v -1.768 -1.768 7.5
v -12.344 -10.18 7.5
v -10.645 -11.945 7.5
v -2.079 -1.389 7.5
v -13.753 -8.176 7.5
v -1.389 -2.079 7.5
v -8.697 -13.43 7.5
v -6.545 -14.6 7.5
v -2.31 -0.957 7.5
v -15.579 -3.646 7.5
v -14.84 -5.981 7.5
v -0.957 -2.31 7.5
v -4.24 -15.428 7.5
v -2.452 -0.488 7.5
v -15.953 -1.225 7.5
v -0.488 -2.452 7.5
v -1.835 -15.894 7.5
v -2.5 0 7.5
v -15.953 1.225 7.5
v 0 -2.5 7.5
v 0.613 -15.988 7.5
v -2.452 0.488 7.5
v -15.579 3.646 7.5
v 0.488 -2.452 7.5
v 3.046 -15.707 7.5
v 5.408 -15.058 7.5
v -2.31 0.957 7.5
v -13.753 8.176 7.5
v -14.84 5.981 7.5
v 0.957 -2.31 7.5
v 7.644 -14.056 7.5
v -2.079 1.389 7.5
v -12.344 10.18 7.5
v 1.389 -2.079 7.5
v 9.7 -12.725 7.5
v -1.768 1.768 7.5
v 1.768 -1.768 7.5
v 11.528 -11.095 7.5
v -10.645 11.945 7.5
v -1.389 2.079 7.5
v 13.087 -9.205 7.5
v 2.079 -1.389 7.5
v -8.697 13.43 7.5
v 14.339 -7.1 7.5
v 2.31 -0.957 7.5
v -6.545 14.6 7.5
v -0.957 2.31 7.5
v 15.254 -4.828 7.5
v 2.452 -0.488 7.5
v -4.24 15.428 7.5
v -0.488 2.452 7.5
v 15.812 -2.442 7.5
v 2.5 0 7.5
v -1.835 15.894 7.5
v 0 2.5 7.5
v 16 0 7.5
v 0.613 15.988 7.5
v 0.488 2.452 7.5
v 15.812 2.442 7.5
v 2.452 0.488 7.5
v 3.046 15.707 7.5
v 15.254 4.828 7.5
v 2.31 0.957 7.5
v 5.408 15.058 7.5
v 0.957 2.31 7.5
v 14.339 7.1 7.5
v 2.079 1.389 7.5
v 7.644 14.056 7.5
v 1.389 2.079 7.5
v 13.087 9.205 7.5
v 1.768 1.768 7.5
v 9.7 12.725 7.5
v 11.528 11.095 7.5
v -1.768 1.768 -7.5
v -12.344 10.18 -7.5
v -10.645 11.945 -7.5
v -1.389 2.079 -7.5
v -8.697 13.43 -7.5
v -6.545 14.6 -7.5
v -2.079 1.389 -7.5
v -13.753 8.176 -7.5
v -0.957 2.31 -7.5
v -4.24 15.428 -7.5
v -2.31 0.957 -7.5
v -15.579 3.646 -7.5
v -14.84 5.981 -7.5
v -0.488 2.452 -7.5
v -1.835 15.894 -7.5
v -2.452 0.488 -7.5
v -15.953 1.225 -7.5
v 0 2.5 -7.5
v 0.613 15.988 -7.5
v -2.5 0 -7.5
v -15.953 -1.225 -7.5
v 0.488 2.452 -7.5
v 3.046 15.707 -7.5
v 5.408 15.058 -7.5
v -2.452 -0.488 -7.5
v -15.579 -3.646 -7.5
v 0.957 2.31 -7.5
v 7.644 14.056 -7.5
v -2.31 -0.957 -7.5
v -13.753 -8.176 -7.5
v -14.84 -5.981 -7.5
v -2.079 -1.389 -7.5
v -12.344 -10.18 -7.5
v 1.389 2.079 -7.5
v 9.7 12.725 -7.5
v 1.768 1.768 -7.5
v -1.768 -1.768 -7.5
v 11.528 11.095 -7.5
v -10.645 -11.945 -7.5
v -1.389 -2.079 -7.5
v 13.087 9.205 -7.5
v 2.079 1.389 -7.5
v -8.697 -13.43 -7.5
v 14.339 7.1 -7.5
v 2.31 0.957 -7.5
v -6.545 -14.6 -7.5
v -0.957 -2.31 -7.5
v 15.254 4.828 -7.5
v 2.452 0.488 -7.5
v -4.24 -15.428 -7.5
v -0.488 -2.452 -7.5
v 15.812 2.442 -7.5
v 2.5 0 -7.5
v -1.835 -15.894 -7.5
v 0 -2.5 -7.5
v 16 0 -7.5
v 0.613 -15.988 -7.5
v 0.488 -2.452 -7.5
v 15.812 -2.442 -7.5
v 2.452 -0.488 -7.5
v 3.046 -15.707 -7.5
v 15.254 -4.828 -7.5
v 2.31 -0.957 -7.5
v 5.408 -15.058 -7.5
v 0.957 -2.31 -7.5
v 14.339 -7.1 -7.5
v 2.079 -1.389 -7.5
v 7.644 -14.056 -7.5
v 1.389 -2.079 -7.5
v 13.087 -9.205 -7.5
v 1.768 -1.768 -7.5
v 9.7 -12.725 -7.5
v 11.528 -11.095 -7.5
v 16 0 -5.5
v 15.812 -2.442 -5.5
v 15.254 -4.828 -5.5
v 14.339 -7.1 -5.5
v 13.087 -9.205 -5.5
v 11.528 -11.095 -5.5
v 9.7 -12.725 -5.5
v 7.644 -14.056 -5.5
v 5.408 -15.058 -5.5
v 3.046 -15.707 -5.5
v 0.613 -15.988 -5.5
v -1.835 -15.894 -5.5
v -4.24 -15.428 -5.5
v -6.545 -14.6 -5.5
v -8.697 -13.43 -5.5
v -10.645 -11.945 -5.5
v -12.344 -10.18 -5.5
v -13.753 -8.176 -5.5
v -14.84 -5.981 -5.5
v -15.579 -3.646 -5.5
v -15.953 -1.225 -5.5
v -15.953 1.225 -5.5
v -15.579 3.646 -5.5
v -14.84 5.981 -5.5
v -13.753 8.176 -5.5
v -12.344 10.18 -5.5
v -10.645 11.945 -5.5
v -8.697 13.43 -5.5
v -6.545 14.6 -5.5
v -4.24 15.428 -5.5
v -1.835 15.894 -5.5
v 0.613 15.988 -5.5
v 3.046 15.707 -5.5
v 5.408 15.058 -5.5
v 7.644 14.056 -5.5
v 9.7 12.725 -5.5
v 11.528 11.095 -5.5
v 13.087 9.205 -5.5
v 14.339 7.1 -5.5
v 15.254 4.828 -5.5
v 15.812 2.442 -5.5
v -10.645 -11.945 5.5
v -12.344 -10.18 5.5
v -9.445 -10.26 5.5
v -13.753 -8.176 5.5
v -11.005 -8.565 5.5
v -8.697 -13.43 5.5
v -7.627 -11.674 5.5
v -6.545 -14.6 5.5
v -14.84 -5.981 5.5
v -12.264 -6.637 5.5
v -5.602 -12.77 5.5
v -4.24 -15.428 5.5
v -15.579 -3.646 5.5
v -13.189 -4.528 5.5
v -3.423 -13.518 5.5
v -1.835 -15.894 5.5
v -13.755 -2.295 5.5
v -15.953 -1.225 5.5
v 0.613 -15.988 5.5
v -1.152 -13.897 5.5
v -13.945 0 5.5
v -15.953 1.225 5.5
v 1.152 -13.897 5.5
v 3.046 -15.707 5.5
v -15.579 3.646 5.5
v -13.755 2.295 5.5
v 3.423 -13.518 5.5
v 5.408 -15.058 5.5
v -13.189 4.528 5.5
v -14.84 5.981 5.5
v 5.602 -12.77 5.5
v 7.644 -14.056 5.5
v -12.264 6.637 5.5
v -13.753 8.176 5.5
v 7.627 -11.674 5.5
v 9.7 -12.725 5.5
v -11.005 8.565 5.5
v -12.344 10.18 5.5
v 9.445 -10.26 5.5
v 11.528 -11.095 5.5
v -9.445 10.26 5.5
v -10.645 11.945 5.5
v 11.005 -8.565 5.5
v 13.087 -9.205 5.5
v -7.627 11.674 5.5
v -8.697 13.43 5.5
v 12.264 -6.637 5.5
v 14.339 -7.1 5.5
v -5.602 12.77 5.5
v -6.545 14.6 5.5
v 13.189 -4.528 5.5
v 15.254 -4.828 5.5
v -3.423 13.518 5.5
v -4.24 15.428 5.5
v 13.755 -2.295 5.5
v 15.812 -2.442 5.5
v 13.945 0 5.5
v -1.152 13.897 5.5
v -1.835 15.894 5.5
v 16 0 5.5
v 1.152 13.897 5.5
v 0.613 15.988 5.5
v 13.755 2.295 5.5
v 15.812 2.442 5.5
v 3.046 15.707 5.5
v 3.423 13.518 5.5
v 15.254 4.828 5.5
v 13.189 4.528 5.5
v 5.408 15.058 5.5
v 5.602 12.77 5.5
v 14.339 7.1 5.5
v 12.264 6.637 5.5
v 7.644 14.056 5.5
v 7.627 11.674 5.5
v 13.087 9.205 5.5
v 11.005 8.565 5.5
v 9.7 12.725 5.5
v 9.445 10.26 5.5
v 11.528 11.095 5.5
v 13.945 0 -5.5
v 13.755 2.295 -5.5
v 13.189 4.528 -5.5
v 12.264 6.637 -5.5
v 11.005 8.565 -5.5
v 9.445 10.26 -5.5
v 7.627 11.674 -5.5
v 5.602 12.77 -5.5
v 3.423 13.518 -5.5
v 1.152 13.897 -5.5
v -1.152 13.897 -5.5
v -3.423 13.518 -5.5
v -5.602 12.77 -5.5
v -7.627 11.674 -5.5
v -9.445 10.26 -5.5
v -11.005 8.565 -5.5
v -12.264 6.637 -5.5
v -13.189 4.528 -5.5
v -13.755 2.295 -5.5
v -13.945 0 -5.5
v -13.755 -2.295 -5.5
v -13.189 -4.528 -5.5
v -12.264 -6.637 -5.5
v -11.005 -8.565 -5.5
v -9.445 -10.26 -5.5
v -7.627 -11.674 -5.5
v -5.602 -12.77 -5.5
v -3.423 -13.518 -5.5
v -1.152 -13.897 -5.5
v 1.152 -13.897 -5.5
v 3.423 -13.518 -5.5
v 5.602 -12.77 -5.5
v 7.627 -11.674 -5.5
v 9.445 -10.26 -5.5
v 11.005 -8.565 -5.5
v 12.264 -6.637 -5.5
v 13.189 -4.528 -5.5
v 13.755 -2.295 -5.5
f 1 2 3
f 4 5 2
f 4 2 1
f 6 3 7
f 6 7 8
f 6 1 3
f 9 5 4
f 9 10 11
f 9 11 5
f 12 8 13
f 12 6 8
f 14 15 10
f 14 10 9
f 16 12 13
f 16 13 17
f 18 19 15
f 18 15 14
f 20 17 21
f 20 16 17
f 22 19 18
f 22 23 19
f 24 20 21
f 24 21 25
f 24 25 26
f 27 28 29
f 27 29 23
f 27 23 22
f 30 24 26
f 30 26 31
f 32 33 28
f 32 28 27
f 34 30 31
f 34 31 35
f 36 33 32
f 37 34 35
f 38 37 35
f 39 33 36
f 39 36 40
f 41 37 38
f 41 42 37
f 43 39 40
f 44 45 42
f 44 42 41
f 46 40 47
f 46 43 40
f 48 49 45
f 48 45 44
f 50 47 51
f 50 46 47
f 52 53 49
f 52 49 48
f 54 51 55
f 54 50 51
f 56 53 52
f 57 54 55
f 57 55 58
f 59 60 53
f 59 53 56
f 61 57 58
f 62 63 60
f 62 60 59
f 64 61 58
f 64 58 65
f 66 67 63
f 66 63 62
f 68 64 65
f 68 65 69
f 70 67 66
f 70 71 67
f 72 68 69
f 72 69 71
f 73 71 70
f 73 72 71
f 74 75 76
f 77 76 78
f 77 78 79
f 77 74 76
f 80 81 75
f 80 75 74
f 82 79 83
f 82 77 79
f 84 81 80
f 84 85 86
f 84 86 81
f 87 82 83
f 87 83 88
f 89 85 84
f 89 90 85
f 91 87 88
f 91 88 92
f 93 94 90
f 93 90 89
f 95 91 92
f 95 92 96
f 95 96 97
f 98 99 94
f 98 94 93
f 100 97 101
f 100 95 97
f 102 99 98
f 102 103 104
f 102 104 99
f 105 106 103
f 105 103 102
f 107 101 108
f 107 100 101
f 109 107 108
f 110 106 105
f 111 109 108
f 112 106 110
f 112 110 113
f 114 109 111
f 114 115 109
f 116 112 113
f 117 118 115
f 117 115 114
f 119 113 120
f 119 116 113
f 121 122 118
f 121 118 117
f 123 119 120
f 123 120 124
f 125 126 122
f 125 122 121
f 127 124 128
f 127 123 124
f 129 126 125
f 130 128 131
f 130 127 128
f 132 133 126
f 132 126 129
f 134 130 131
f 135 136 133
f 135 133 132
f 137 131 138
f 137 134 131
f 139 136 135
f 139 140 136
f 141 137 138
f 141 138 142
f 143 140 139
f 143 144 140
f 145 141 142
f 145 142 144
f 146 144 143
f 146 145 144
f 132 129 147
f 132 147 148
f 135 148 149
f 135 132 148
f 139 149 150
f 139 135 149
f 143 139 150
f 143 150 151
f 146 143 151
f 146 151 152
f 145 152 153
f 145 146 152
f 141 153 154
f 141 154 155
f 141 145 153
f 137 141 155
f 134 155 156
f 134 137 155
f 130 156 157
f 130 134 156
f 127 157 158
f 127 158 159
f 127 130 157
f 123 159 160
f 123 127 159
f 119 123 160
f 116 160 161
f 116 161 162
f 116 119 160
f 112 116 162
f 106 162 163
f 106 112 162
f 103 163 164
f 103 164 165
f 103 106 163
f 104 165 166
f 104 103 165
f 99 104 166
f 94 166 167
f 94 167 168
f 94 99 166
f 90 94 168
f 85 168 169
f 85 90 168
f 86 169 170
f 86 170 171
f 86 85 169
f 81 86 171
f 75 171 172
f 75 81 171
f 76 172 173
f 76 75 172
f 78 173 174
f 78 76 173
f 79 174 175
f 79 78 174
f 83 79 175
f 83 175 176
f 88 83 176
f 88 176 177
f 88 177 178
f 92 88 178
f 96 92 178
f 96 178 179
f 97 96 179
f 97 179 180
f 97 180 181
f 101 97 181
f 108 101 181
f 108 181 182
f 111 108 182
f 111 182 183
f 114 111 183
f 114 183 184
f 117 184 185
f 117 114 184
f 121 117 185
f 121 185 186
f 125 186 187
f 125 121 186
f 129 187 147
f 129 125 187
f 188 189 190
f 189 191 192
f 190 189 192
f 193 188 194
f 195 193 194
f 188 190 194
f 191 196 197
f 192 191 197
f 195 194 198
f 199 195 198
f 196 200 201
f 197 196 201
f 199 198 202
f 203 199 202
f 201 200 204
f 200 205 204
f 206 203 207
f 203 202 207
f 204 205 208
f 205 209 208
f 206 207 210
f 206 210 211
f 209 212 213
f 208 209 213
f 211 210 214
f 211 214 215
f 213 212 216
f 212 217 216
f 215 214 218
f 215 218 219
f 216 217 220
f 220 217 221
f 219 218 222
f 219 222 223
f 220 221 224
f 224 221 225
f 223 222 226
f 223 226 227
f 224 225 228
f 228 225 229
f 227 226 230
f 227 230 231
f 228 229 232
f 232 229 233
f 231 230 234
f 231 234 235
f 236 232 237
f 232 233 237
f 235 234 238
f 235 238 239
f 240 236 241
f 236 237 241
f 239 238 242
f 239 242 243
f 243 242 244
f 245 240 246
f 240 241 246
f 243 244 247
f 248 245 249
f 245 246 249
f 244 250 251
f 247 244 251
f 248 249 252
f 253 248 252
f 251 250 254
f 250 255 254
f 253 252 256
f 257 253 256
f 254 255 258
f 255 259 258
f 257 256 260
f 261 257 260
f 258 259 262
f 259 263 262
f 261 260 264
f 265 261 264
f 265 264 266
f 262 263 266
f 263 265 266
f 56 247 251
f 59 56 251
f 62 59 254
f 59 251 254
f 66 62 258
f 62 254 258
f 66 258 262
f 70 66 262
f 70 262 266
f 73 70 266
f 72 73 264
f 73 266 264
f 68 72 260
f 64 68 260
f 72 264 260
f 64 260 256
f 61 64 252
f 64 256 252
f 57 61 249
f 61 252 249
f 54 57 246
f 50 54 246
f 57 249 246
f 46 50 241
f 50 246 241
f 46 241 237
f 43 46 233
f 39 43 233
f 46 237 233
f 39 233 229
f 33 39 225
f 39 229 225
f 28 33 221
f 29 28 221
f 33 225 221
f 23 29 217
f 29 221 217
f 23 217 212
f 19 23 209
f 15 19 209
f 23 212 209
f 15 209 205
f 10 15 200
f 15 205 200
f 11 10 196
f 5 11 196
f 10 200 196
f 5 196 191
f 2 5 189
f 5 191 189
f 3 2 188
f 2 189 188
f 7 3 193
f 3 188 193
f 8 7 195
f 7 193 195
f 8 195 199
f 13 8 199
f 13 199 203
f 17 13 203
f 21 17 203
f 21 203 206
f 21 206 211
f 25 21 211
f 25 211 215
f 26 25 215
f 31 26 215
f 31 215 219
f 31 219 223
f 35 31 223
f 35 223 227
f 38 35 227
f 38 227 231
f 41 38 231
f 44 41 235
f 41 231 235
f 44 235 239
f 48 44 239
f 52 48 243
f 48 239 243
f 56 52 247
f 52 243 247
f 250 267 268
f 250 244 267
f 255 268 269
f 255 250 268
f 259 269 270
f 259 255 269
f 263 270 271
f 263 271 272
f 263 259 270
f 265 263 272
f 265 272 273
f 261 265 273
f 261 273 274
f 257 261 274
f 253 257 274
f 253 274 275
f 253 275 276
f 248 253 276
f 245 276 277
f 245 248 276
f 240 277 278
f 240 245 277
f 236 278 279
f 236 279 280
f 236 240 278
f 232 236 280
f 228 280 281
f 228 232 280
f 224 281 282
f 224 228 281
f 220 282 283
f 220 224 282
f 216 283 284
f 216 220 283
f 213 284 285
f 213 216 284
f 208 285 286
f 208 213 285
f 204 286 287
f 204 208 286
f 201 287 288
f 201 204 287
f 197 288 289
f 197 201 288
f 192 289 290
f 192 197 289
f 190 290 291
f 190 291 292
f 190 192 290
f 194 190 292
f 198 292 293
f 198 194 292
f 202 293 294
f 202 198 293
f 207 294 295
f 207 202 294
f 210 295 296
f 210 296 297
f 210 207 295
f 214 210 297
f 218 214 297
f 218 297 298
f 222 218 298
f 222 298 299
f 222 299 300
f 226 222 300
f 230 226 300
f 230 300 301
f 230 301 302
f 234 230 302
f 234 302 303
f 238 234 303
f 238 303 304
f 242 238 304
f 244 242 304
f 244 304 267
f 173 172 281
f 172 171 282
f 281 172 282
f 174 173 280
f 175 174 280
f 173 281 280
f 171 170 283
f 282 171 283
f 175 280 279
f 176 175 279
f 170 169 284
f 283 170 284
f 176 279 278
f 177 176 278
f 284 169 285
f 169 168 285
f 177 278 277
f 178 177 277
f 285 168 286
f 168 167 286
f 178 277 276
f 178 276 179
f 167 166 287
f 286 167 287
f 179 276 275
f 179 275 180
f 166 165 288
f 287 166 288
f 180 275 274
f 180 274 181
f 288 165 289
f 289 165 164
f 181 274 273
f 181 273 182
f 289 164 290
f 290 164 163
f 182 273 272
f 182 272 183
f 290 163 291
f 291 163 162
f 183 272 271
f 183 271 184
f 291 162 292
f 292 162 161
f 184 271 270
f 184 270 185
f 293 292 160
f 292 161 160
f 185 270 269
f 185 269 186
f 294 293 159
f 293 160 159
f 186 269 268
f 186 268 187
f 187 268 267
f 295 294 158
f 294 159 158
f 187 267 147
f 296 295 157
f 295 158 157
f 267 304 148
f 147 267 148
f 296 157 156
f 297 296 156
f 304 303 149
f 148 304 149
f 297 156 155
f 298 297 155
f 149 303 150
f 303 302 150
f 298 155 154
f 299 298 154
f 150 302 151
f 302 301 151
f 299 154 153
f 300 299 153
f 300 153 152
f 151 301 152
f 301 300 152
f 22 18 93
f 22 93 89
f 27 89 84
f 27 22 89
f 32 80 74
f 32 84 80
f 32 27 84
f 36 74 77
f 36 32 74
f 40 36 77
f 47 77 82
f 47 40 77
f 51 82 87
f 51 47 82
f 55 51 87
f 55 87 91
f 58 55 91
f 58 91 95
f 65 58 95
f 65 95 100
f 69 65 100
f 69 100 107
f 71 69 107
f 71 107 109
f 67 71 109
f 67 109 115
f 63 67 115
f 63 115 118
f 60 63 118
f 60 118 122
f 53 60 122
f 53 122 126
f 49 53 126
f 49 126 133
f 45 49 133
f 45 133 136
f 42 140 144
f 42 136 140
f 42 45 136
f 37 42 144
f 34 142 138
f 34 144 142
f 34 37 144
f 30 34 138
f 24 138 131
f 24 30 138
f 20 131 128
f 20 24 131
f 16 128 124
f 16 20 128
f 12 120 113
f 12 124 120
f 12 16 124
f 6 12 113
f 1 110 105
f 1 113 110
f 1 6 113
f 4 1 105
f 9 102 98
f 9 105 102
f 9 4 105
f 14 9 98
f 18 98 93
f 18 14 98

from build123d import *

# Parameters (mm, degrees)
SKETCH_1_R               = 13.945
EXTRUDE_1_DEPTH          = 5.5
SKETCH_2_R               = 16
EXTRUDE_2_DEPTH          = 2
EXTRUDE_START            = 2
SKETCH_3_R               = 16
EXTRUDE_3_DEPTH          = 2
CUT_EXTRUDE_1_DEPTH      = 28.147743921
CUT_EXTRUDE_1_DEPTH_BACK = 28.147743921
SKETCH_4_R               = 2.5


with BuildPart() as part:
    # 草图1 → 凸台-拉伸1 (new, symmetric)
    with BuildSketch(Plane.XY):
        Circle(SKETCH_1_R)
    extrude(amount=EXTRUDE_1_DEPTH, both=True)

    # 草图2 → 凸台-拉伸2 (add)
    with BuildSketch(Plane.XY.offset(5.5)):
        Circle(SKETCH_2_R)
    extrude(amount=EXTRUDE_2_DEPTH)

    # 草图3 → 凸台-拉伸3 (add)
    with BuildSketch(Plane(origin=(0, 0, -5.5), x_dir=(-1, 0, 0), z_dir=(0, 0, -1)).offset(EXTRUDE_START)):
        with Locations(Location((0, 0, 0), (0, 0, 180))):
            Circle(SKETCH_3_R)
    extrude(amount=-EXTRUDE_3_DEPTH)

    # 草图4 → 切除-拉伸1 (cut, two sides: drawn at the far end of the back side and taken through both)
    with BuildSketch(Plane(origin=(0, 0, -7.5), x_dir=(-1, 0, 0), z_dir=(0, 0, -1)).offset(-CUT_EXTRUDE_1_DEPTH_BACK)):
        Circle(SKETCH_4_R)
    extrude(amount=CUT_EXTRUDE_1_DEPTH + CUT_EXTRUDE_1_DEPTH_BACK, mode=Mode.SUBTRACT)


solid = part.part
